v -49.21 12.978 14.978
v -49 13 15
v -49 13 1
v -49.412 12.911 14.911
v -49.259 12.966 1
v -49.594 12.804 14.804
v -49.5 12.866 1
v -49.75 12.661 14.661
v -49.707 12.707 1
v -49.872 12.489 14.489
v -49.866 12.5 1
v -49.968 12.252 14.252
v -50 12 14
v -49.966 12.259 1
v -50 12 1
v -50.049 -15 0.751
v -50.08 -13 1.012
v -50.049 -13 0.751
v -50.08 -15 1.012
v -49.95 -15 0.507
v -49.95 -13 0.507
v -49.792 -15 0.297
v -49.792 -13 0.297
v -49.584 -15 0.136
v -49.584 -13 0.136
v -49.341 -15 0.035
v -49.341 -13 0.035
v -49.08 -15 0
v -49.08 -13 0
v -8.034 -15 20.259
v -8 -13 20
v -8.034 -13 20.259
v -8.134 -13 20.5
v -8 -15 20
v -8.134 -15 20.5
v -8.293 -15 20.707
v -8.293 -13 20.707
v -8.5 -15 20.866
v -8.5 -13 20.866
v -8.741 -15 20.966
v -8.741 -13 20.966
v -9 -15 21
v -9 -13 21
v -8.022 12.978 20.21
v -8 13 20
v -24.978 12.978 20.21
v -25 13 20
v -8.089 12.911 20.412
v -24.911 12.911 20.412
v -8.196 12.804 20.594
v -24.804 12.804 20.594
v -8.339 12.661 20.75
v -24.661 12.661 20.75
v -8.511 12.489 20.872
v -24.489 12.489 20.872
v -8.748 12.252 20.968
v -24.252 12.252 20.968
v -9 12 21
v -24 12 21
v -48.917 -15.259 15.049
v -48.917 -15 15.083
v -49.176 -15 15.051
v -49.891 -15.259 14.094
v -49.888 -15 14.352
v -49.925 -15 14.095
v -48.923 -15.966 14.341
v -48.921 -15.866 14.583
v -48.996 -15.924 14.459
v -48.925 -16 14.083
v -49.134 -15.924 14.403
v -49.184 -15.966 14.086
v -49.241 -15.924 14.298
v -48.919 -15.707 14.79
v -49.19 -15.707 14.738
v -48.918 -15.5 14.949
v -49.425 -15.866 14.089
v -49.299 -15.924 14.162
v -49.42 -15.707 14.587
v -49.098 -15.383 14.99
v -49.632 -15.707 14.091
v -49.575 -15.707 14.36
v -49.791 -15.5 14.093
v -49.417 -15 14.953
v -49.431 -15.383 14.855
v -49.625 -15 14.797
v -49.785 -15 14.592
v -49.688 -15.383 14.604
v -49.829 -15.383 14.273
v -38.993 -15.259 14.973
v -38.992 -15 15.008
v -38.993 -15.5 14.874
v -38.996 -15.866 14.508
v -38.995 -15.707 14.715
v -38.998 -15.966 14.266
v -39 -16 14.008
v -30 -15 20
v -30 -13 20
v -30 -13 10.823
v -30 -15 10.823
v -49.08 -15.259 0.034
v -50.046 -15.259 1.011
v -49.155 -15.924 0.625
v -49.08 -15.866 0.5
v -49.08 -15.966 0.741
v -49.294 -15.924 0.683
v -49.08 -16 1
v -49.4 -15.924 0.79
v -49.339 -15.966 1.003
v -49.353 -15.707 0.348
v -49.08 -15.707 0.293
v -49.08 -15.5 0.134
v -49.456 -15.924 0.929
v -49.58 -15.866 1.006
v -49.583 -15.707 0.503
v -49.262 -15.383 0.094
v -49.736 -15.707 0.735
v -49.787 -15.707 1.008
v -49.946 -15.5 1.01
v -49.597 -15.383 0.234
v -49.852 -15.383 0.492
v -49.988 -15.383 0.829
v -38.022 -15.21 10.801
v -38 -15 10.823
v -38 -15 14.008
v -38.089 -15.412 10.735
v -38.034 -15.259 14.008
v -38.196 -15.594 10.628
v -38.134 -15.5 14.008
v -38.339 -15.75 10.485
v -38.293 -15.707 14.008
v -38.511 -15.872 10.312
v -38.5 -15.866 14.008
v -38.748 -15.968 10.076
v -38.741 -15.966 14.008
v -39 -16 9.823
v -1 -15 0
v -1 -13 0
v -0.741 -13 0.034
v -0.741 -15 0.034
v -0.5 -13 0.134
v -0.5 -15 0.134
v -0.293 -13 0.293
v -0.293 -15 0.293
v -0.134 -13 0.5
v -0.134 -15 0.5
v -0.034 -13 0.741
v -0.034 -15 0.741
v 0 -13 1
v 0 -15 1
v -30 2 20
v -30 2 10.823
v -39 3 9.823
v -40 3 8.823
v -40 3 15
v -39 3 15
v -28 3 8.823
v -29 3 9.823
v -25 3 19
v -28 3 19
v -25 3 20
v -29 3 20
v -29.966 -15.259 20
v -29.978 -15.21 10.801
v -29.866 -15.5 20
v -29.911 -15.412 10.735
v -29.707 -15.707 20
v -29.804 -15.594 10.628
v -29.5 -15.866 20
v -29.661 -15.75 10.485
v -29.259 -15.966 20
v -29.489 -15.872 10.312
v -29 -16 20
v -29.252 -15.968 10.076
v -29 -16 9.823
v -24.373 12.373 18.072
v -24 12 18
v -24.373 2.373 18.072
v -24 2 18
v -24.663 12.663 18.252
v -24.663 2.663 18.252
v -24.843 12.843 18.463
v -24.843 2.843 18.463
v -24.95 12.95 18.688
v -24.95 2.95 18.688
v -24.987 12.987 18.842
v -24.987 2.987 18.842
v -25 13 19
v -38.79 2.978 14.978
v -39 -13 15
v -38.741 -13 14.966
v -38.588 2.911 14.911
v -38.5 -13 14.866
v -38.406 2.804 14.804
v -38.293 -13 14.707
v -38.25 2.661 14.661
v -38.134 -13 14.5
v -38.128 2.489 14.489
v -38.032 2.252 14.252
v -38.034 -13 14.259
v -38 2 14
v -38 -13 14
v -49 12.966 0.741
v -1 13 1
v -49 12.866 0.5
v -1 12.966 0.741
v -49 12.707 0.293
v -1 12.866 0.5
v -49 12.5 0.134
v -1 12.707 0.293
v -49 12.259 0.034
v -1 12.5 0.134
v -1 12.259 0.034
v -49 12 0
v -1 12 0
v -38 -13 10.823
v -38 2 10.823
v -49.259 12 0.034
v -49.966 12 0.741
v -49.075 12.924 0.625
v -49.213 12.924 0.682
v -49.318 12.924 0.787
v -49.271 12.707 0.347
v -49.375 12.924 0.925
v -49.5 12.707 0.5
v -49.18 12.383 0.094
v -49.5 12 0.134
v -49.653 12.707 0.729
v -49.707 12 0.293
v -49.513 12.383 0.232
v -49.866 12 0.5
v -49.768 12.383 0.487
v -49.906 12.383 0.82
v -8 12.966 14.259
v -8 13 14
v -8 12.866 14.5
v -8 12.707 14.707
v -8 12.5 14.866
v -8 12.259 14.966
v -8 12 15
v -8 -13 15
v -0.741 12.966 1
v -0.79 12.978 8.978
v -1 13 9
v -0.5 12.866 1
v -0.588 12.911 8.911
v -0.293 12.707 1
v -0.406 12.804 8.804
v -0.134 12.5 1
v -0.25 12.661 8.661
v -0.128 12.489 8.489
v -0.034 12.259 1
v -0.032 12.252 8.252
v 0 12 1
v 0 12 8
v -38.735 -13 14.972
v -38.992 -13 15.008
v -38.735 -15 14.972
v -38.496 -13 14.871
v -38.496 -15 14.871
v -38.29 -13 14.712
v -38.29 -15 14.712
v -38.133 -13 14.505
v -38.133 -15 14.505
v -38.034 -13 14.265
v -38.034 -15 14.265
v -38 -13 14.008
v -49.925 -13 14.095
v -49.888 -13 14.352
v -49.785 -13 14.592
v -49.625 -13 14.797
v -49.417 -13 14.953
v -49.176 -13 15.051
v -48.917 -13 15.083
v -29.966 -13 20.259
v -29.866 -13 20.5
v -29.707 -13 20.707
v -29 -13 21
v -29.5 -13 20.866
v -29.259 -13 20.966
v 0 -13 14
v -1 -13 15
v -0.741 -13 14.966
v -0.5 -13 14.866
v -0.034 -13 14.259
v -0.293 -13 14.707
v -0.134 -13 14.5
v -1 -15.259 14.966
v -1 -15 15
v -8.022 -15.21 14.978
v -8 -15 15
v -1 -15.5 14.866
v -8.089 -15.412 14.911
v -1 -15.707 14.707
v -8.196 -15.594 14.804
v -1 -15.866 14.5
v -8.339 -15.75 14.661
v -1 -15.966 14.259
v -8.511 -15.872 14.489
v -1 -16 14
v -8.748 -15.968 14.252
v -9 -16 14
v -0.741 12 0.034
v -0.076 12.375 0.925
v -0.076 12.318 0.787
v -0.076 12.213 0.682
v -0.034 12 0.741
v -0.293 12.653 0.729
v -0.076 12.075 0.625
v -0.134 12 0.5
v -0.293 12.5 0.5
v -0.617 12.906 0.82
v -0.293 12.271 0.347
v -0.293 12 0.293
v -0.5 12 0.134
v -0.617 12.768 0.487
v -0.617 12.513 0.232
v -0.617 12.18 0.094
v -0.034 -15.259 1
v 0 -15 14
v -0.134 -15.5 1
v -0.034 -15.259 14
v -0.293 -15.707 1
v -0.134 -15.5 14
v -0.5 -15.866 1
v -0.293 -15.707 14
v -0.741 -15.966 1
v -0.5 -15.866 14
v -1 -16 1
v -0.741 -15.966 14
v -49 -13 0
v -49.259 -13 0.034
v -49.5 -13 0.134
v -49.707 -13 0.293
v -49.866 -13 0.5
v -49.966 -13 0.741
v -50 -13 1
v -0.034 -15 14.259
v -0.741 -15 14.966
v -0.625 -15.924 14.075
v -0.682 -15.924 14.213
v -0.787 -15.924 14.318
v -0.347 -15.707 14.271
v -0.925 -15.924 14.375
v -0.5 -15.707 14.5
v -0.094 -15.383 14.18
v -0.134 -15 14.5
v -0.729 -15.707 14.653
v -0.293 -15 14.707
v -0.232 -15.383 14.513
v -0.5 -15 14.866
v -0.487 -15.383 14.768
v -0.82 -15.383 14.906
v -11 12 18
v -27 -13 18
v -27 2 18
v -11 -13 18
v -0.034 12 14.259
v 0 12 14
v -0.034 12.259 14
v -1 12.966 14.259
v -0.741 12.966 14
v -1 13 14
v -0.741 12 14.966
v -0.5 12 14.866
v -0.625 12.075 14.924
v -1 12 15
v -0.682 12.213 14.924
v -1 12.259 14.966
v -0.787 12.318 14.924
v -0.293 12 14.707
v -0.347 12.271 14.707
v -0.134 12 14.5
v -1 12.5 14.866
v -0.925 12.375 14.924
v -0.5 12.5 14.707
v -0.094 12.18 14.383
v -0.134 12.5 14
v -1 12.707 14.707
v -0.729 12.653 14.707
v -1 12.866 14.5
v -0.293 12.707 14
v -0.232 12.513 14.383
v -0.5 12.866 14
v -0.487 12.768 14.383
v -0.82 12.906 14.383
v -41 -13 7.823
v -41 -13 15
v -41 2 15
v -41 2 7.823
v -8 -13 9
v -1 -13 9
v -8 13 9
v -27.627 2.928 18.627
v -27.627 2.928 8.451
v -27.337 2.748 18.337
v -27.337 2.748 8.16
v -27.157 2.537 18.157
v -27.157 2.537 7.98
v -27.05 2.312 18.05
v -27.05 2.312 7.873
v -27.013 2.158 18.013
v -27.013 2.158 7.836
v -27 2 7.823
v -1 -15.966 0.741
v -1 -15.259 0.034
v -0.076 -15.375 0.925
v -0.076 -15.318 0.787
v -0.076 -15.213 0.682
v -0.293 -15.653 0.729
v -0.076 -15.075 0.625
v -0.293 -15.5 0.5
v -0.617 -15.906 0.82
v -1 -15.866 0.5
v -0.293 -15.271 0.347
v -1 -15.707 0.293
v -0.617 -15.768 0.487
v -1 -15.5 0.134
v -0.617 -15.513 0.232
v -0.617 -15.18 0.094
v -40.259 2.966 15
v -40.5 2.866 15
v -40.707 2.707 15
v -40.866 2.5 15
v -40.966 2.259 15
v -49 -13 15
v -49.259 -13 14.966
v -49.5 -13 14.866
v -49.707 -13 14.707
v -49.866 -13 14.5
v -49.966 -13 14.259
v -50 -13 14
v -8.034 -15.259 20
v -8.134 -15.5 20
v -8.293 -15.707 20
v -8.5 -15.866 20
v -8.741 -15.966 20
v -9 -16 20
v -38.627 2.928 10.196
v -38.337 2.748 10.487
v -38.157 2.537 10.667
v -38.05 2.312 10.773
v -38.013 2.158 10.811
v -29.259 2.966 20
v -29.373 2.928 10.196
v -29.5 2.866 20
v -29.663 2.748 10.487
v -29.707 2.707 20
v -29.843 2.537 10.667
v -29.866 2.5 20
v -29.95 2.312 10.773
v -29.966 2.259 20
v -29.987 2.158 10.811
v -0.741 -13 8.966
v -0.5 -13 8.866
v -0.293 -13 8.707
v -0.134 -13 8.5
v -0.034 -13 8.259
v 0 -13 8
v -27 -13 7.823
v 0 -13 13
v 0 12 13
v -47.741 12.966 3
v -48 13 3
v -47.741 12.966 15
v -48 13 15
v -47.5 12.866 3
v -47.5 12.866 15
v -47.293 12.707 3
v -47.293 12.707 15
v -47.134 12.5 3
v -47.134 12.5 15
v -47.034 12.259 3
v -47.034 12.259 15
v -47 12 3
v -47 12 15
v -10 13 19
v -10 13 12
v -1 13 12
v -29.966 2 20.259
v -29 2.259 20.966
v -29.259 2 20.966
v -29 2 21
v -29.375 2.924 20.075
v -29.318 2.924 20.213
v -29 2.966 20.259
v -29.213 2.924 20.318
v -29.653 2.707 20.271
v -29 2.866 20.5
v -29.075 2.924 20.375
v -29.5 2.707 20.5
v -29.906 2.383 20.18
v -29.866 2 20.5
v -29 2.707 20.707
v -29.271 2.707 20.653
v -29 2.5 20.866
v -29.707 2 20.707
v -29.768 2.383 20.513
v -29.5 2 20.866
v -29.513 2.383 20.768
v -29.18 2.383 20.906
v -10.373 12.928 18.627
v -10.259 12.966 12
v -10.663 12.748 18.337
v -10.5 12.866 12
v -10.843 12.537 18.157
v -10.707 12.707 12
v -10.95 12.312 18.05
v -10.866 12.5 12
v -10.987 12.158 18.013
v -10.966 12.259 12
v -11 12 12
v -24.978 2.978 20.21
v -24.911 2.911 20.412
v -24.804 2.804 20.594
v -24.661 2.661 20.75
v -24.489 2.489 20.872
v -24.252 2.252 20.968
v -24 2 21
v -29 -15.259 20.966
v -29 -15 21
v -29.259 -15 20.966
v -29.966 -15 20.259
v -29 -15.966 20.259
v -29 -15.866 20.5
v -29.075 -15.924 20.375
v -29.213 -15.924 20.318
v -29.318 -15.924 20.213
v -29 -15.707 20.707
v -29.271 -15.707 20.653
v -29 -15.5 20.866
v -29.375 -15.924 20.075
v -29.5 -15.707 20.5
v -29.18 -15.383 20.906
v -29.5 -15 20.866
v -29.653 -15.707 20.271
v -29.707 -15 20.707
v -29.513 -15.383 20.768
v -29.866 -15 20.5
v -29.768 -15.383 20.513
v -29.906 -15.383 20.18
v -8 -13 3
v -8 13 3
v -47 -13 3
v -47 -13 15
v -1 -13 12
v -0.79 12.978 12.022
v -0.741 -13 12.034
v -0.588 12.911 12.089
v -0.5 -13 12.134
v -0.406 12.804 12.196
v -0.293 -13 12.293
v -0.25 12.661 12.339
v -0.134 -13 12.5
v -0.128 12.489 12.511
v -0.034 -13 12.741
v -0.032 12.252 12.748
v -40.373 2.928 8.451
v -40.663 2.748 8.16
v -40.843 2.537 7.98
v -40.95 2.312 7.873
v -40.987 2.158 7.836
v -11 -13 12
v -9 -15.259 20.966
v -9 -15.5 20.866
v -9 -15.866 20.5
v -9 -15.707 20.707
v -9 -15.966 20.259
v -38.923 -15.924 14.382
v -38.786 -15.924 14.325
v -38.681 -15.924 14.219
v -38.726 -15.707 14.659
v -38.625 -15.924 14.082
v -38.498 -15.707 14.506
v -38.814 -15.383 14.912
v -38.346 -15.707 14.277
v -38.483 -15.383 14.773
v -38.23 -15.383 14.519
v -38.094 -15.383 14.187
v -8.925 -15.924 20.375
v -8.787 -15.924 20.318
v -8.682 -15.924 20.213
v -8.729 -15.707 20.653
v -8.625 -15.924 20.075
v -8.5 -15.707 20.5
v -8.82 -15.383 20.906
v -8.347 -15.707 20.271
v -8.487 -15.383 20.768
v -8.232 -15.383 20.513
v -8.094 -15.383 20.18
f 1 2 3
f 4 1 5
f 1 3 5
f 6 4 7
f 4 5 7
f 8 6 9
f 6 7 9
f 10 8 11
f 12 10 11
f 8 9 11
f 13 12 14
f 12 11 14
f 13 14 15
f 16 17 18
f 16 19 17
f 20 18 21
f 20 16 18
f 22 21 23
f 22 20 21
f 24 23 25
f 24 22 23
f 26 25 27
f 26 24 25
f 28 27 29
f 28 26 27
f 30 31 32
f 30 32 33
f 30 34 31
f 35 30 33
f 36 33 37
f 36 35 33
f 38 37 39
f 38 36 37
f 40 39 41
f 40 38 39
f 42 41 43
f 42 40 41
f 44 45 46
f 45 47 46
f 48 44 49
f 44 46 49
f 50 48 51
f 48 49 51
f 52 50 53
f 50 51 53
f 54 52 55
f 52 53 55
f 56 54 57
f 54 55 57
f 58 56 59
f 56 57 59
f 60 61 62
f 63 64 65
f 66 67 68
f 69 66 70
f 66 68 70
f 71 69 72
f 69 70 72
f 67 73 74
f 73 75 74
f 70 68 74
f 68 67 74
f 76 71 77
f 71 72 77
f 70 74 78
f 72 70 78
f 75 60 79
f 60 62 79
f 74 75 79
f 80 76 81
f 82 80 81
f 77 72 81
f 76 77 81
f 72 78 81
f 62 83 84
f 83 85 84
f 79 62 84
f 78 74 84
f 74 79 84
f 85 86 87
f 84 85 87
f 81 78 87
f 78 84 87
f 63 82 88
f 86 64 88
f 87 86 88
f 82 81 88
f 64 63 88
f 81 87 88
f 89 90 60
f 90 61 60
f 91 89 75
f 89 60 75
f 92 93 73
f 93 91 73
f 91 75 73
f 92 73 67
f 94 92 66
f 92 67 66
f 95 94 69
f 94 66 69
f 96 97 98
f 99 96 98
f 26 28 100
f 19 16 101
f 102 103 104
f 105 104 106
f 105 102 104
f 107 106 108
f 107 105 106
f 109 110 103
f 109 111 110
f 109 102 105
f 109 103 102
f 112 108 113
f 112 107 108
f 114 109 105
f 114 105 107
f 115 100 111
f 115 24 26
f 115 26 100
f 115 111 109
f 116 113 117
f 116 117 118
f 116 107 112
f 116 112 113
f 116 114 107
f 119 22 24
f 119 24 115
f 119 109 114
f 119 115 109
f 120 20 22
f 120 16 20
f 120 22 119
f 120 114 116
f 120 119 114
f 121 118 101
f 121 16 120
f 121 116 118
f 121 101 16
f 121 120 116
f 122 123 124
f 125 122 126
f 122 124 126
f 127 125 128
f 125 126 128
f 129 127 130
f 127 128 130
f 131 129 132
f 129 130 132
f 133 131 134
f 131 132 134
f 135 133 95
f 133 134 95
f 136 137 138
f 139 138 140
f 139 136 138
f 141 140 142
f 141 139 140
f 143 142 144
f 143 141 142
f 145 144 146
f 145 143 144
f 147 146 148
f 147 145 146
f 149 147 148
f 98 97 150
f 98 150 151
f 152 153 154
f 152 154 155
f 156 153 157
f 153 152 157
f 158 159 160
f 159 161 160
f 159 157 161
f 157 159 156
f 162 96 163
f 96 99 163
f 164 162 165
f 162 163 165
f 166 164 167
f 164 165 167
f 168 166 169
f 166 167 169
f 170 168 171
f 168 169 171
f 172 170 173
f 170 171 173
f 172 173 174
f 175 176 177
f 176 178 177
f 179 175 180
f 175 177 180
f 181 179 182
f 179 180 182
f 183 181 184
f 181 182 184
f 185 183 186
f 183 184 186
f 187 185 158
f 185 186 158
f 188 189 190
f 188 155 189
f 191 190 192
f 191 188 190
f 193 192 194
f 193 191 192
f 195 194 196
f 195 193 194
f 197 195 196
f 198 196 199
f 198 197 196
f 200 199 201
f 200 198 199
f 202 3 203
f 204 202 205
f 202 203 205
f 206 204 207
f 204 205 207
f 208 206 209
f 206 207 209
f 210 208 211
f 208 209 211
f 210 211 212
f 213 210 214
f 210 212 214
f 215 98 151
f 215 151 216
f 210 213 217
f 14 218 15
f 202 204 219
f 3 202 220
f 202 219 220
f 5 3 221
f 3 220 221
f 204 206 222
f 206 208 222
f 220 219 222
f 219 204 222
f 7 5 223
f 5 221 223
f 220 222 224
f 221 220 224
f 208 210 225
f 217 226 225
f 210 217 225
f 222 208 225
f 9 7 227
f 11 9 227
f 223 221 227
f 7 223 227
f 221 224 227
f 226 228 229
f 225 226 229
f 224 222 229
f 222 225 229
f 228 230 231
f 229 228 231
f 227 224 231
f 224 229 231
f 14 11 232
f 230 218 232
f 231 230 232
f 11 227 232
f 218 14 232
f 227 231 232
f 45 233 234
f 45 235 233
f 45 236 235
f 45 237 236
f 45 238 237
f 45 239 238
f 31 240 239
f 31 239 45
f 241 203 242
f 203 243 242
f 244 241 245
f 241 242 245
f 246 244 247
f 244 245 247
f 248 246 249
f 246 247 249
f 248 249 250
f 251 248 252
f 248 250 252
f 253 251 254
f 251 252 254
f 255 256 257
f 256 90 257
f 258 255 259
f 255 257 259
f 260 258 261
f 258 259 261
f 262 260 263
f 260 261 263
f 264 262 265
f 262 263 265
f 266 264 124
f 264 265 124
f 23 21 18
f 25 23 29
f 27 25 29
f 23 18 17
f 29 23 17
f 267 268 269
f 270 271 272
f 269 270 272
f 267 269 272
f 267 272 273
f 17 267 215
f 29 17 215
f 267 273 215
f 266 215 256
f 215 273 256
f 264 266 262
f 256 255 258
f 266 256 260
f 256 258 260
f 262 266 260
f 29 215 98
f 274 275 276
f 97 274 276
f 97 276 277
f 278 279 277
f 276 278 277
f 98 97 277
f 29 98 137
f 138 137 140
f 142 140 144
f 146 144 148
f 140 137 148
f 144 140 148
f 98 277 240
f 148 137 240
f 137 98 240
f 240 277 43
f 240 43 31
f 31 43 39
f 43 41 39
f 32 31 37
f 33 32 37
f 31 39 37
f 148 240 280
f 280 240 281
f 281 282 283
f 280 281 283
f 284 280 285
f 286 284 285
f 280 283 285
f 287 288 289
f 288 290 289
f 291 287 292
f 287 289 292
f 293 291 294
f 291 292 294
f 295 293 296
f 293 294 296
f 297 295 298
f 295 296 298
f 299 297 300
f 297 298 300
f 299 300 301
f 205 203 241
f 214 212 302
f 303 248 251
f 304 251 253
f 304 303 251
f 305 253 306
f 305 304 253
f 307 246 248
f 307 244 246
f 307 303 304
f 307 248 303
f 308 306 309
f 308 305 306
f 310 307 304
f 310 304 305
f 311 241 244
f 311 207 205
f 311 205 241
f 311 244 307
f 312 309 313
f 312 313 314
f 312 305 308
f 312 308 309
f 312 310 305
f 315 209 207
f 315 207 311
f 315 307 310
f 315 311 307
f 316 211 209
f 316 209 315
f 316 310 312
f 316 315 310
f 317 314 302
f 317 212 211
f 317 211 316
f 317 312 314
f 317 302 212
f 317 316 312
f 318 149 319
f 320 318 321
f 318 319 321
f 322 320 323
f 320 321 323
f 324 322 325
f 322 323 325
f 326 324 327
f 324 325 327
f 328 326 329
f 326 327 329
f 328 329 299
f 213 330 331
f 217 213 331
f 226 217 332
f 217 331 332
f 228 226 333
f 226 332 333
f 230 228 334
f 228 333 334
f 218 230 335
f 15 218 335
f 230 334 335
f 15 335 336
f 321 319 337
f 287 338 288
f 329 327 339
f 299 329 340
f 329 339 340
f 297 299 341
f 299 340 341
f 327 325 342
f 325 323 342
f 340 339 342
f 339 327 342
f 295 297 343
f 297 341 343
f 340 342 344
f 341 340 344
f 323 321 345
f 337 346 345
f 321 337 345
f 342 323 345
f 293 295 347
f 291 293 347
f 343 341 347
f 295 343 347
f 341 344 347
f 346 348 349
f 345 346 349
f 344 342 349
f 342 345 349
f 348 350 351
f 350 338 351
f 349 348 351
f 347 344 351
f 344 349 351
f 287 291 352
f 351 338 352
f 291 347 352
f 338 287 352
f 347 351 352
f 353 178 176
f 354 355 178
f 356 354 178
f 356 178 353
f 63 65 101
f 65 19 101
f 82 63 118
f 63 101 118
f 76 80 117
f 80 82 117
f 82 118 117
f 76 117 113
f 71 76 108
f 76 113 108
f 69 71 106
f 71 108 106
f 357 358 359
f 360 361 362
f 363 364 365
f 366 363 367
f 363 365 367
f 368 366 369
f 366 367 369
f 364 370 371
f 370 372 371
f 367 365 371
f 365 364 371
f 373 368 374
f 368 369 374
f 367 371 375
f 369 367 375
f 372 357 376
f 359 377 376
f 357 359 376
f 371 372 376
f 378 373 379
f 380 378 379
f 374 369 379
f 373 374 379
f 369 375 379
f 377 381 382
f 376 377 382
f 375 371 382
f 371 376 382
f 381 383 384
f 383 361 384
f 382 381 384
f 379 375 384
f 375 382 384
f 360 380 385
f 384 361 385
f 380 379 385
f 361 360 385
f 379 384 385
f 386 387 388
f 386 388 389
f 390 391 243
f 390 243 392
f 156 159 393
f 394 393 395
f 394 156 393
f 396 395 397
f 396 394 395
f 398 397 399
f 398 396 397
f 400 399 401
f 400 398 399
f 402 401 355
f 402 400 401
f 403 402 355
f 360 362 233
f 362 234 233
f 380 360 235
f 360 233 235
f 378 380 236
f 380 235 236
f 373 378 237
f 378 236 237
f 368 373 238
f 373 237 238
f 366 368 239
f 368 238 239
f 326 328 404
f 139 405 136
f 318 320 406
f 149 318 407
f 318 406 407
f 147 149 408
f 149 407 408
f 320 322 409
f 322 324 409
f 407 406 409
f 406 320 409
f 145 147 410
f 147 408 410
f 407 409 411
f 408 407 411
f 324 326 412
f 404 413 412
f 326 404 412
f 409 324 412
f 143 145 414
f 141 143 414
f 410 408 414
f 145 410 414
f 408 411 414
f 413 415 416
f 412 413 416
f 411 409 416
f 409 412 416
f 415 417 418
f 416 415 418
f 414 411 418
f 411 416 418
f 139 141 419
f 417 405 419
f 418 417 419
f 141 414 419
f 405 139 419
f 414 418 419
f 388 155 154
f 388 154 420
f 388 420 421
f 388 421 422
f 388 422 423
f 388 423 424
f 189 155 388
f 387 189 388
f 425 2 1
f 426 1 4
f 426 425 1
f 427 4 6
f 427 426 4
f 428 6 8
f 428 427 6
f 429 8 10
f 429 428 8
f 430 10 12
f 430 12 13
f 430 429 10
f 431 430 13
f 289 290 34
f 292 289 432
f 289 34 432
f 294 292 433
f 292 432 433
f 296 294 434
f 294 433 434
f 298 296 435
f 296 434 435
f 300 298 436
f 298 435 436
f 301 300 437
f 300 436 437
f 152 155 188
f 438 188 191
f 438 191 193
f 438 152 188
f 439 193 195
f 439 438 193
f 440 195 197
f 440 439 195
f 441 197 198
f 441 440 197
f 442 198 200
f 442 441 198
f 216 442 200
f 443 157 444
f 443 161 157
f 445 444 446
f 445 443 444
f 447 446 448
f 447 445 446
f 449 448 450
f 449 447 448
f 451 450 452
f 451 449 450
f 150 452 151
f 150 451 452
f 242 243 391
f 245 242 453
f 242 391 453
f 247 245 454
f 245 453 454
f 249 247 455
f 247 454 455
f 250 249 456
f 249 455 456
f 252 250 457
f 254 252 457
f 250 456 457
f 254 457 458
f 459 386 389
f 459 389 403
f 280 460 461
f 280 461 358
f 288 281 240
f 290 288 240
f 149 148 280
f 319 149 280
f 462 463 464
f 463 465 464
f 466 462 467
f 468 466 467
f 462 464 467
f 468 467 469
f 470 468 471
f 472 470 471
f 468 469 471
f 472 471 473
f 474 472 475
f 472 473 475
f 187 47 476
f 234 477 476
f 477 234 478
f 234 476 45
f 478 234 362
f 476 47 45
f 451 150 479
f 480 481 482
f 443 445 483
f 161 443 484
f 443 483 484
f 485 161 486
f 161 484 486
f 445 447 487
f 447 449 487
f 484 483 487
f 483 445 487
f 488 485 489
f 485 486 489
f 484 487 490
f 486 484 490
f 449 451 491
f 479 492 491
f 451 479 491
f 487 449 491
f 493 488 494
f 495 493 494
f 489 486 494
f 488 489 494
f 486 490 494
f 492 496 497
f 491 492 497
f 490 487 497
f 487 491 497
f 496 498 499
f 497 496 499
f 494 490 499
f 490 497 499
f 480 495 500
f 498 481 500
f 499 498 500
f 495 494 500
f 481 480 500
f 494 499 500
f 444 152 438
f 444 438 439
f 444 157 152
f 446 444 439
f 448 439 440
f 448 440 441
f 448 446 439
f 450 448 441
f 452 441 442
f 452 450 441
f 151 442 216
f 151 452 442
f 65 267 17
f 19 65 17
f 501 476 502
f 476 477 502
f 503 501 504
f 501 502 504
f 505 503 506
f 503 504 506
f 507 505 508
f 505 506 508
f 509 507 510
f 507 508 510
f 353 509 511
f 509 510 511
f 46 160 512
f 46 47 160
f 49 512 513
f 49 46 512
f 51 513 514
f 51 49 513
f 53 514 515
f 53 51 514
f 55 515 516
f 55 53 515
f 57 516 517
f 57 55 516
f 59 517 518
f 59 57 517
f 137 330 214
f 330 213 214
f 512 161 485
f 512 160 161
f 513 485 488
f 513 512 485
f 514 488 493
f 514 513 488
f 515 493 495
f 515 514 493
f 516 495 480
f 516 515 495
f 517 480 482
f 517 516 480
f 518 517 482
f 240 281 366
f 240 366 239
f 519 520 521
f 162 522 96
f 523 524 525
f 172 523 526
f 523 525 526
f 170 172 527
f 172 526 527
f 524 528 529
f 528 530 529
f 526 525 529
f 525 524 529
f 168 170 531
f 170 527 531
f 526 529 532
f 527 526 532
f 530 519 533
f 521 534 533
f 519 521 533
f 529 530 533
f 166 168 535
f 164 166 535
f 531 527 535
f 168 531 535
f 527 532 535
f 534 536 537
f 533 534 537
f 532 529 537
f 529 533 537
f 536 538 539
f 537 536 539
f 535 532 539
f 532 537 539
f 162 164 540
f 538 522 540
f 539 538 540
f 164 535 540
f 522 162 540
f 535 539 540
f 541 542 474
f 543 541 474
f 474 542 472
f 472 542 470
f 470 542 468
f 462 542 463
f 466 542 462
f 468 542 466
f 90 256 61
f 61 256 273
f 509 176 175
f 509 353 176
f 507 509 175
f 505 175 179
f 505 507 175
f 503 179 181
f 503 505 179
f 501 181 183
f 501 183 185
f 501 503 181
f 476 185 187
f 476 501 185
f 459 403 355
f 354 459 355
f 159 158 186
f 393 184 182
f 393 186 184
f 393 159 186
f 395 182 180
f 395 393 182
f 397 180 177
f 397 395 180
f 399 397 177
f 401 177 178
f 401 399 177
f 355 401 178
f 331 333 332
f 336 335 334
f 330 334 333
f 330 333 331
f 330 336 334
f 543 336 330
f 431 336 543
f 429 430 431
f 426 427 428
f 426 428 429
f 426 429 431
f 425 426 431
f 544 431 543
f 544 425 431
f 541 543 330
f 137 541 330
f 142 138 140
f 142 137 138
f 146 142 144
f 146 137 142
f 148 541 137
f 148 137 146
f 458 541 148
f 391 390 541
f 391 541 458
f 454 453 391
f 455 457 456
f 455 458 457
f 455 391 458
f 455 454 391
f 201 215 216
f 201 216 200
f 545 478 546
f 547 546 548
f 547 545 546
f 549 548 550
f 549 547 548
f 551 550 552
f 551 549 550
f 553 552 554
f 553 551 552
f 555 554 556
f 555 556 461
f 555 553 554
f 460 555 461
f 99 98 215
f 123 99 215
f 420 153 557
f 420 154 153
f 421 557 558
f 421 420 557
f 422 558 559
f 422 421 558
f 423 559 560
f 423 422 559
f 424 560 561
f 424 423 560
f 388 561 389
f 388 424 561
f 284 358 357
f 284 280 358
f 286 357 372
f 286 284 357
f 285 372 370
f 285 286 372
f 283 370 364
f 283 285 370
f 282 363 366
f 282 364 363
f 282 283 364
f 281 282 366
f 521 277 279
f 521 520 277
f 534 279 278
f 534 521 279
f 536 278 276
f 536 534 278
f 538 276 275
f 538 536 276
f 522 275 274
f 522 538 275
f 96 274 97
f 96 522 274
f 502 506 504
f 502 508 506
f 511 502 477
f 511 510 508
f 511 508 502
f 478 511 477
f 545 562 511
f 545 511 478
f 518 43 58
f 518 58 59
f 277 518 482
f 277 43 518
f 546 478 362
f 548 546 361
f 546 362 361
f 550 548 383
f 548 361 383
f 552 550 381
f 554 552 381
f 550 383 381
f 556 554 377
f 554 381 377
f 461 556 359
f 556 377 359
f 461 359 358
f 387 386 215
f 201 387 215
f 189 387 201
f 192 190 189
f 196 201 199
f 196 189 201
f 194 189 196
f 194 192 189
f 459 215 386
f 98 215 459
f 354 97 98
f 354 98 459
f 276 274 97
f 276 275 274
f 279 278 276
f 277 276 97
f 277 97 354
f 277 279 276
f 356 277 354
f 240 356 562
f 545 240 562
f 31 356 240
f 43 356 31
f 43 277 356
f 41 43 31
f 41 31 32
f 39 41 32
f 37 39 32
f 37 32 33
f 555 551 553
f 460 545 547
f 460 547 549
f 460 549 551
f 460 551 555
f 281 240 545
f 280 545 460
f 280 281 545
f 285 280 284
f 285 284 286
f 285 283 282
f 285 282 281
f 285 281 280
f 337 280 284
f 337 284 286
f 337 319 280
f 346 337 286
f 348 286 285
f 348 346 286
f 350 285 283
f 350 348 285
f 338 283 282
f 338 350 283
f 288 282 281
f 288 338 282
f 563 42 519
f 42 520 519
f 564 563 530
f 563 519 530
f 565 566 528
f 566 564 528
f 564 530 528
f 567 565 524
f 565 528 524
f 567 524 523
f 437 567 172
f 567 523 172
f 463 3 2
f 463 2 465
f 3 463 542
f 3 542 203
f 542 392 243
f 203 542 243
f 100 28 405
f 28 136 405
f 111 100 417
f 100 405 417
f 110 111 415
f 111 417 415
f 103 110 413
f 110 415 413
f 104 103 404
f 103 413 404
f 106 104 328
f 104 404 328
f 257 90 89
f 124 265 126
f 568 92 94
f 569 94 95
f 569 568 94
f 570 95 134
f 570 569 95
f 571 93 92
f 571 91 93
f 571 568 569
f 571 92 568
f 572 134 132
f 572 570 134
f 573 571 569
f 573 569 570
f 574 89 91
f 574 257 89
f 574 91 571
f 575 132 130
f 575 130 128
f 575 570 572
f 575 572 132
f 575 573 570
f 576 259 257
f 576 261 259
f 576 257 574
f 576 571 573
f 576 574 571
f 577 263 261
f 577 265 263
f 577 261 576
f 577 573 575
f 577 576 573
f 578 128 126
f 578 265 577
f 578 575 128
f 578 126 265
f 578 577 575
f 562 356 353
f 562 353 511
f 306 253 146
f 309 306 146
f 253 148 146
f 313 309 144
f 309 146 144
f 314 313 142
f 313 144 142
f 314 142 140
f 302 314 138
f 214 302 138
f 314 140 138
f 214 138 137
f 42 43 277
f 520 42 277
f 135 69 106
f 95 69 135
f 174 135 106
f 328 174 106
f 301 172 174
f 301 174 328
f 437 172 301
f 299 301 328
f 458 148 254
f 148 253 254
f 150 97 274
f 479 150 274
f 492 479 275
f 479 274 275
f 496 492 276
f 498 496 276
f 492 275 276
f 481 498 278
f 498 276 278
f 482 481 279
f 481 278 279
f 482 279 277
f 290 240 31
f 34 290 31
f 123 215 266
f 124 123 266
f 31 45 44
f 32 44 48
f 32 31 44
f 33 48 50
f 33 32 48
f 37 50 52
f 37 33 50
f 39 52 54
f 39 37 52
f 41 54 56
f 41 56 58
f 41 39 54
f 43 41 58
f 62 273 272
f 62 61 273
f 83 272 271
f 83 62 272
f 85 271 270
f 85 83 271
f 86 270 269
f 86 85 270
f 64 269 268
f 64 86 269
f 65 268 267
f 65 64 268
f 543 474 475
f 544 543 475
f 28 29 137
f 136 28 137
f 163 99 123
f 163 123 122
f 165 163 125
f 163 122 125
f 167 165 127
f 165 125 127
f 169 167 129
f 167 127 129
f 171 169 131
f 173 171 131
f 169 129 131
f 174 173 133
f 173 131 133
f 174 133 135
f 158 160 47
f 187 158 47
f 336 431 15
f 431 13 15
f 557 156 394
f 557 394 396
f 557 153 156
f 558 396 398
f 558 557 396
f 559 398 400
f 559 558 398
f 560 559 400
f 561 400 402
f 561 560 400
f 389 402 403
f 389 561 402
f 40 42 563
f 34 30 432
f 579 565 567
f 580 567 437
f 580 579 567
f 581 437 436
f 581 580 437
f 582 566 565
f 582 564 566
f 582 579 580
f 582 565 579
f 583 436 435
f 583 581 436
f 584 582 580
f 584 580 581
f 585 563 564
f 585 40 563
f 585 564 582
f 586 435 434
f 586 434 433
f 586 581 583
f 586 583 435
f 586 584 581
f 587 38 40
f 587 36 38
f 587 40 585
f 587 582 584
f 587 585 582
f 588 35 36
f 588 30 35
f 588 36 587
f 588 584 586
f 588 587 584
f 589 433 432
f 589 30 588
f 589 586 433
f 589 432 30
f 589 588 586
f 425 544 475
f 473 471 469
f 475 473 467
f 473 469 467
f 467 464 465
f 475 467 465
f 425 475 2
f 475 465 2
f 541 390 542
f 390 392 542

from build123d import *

# Parameters (mm, degrees)
F1_DEPTH = 13
F3_DEPTH = 3
F4_W     = 22
F4_H     = 10
F5_DEPTH = 18
F6_R     = 1
F6_2_R   = 1


with BuildPart() as f1:
    # F0 (on Front) → F1 (new body, symmetric)
    with BuildSketch(Plane.XZ):
        Polygon((-47, 15), (-50, 15), (-50, 0), (0, 0), (0, 9), (-8, 9), (-8, 3), (-47, 3), align=None)
        Polygon((-38, 15), (-41, 15), (-41, 7.823235), (-27, 7.823235), (-27, 18), (-11, 18), (-11, 12), (0, 12), (0, 15), (-8, 15), (-8, 21), (-30, 21), (-30, 10.823235), (-38, 10.823235), align=None)
    extrude(amount=F1_DEPTH, both=True)

    # F4 (on face) → F5 (cut, through all)
    with BuildSketch(Plane.XY.offset(21)):
        with Locations((-36, 8)):
            Rectangle(F4_W, F4_H)
    extrude(amount=-F5_DEPTH, mode=Mode.SUBTRACT)

    # F6
    f6_edges = [f1.edges().sort_by_distance(p)[0] for p in [
        (-50, 0, 0),
        (-38, -5, 15),
        (-25, 13, 0),
        (0, 13, 4.5),
        (0, 13, 13.5),
        (-30, -5, 21),
        (-8, 0, 21),
        (0, 0, 15),
        (0, 0, 0),
        (-16.5, 13, 21),
        (-50, 13, 7.5),
        (-4, 13, 15),
        (-25, 8, 21),
        (-30, 3, 15.911617),
        (-34, 3, 10.823235),
        (-27.5, 3, 21),
        (-50, 0, 15),
        (0, 0, 12),
        (0, 0, 9),
        (-38, 3, 12.911617),
        (-47, 13, 9),
        (-41, 3, 11.411617),
        (-27, 3, 12.911617),
        (-11, 13, 15),
        (-18, 13, 18),
        (-25, 8, 18),
        (-26, 3, 18),
        (-34, 3, 7.823235),
    ]]
    fillet(f6_edges, radius=F6_R)


with BuildPart() as f3:
    # F2 (on face) → F3 (new body)
    with BuildSketch(Plane.XZ.offset(13)):
        Polygon((-38, 15), (-49.912799, 15.09014), (-50.09222, 0), (0, 0), (0, 15), (-8, 15), (-8, 21), (-30, 21), (-30, 10.823235), (-38, 10.823235), align=None)
    extrude(amount=F3_DEPTH)

    # F6#2
    f6_2_edges = [f3.edges().sort_by_distance(p)[0] for p in [
        (-38, -14.5, 15),
        (-49.912799, -14.5, 15.09014),
        (-43.9564, -16, 15.04507),
        (-50.00251, -16, 7.54507),
        (-50.09222, -14.5, 0),
        (-30, -14.5, 21),
        (-8, -14.5, 21),
        (-19, -16, 21),
        (-30, -16, 15.911617),
        (-34, -16, 10.823235),
        (0, -14.5, 15),
        (-25.04611, -16, 0),
        (0, -16, 7.5),
        (0, -14.5, 0),
        (-4, -16, 15),
        (-8, -16, 18),
        (-38, -16, 12.911617),
    ]]
    fillet(f6_2_edges, radius=F6_2_R)


solid = Compound([f1.part, f3.part])
